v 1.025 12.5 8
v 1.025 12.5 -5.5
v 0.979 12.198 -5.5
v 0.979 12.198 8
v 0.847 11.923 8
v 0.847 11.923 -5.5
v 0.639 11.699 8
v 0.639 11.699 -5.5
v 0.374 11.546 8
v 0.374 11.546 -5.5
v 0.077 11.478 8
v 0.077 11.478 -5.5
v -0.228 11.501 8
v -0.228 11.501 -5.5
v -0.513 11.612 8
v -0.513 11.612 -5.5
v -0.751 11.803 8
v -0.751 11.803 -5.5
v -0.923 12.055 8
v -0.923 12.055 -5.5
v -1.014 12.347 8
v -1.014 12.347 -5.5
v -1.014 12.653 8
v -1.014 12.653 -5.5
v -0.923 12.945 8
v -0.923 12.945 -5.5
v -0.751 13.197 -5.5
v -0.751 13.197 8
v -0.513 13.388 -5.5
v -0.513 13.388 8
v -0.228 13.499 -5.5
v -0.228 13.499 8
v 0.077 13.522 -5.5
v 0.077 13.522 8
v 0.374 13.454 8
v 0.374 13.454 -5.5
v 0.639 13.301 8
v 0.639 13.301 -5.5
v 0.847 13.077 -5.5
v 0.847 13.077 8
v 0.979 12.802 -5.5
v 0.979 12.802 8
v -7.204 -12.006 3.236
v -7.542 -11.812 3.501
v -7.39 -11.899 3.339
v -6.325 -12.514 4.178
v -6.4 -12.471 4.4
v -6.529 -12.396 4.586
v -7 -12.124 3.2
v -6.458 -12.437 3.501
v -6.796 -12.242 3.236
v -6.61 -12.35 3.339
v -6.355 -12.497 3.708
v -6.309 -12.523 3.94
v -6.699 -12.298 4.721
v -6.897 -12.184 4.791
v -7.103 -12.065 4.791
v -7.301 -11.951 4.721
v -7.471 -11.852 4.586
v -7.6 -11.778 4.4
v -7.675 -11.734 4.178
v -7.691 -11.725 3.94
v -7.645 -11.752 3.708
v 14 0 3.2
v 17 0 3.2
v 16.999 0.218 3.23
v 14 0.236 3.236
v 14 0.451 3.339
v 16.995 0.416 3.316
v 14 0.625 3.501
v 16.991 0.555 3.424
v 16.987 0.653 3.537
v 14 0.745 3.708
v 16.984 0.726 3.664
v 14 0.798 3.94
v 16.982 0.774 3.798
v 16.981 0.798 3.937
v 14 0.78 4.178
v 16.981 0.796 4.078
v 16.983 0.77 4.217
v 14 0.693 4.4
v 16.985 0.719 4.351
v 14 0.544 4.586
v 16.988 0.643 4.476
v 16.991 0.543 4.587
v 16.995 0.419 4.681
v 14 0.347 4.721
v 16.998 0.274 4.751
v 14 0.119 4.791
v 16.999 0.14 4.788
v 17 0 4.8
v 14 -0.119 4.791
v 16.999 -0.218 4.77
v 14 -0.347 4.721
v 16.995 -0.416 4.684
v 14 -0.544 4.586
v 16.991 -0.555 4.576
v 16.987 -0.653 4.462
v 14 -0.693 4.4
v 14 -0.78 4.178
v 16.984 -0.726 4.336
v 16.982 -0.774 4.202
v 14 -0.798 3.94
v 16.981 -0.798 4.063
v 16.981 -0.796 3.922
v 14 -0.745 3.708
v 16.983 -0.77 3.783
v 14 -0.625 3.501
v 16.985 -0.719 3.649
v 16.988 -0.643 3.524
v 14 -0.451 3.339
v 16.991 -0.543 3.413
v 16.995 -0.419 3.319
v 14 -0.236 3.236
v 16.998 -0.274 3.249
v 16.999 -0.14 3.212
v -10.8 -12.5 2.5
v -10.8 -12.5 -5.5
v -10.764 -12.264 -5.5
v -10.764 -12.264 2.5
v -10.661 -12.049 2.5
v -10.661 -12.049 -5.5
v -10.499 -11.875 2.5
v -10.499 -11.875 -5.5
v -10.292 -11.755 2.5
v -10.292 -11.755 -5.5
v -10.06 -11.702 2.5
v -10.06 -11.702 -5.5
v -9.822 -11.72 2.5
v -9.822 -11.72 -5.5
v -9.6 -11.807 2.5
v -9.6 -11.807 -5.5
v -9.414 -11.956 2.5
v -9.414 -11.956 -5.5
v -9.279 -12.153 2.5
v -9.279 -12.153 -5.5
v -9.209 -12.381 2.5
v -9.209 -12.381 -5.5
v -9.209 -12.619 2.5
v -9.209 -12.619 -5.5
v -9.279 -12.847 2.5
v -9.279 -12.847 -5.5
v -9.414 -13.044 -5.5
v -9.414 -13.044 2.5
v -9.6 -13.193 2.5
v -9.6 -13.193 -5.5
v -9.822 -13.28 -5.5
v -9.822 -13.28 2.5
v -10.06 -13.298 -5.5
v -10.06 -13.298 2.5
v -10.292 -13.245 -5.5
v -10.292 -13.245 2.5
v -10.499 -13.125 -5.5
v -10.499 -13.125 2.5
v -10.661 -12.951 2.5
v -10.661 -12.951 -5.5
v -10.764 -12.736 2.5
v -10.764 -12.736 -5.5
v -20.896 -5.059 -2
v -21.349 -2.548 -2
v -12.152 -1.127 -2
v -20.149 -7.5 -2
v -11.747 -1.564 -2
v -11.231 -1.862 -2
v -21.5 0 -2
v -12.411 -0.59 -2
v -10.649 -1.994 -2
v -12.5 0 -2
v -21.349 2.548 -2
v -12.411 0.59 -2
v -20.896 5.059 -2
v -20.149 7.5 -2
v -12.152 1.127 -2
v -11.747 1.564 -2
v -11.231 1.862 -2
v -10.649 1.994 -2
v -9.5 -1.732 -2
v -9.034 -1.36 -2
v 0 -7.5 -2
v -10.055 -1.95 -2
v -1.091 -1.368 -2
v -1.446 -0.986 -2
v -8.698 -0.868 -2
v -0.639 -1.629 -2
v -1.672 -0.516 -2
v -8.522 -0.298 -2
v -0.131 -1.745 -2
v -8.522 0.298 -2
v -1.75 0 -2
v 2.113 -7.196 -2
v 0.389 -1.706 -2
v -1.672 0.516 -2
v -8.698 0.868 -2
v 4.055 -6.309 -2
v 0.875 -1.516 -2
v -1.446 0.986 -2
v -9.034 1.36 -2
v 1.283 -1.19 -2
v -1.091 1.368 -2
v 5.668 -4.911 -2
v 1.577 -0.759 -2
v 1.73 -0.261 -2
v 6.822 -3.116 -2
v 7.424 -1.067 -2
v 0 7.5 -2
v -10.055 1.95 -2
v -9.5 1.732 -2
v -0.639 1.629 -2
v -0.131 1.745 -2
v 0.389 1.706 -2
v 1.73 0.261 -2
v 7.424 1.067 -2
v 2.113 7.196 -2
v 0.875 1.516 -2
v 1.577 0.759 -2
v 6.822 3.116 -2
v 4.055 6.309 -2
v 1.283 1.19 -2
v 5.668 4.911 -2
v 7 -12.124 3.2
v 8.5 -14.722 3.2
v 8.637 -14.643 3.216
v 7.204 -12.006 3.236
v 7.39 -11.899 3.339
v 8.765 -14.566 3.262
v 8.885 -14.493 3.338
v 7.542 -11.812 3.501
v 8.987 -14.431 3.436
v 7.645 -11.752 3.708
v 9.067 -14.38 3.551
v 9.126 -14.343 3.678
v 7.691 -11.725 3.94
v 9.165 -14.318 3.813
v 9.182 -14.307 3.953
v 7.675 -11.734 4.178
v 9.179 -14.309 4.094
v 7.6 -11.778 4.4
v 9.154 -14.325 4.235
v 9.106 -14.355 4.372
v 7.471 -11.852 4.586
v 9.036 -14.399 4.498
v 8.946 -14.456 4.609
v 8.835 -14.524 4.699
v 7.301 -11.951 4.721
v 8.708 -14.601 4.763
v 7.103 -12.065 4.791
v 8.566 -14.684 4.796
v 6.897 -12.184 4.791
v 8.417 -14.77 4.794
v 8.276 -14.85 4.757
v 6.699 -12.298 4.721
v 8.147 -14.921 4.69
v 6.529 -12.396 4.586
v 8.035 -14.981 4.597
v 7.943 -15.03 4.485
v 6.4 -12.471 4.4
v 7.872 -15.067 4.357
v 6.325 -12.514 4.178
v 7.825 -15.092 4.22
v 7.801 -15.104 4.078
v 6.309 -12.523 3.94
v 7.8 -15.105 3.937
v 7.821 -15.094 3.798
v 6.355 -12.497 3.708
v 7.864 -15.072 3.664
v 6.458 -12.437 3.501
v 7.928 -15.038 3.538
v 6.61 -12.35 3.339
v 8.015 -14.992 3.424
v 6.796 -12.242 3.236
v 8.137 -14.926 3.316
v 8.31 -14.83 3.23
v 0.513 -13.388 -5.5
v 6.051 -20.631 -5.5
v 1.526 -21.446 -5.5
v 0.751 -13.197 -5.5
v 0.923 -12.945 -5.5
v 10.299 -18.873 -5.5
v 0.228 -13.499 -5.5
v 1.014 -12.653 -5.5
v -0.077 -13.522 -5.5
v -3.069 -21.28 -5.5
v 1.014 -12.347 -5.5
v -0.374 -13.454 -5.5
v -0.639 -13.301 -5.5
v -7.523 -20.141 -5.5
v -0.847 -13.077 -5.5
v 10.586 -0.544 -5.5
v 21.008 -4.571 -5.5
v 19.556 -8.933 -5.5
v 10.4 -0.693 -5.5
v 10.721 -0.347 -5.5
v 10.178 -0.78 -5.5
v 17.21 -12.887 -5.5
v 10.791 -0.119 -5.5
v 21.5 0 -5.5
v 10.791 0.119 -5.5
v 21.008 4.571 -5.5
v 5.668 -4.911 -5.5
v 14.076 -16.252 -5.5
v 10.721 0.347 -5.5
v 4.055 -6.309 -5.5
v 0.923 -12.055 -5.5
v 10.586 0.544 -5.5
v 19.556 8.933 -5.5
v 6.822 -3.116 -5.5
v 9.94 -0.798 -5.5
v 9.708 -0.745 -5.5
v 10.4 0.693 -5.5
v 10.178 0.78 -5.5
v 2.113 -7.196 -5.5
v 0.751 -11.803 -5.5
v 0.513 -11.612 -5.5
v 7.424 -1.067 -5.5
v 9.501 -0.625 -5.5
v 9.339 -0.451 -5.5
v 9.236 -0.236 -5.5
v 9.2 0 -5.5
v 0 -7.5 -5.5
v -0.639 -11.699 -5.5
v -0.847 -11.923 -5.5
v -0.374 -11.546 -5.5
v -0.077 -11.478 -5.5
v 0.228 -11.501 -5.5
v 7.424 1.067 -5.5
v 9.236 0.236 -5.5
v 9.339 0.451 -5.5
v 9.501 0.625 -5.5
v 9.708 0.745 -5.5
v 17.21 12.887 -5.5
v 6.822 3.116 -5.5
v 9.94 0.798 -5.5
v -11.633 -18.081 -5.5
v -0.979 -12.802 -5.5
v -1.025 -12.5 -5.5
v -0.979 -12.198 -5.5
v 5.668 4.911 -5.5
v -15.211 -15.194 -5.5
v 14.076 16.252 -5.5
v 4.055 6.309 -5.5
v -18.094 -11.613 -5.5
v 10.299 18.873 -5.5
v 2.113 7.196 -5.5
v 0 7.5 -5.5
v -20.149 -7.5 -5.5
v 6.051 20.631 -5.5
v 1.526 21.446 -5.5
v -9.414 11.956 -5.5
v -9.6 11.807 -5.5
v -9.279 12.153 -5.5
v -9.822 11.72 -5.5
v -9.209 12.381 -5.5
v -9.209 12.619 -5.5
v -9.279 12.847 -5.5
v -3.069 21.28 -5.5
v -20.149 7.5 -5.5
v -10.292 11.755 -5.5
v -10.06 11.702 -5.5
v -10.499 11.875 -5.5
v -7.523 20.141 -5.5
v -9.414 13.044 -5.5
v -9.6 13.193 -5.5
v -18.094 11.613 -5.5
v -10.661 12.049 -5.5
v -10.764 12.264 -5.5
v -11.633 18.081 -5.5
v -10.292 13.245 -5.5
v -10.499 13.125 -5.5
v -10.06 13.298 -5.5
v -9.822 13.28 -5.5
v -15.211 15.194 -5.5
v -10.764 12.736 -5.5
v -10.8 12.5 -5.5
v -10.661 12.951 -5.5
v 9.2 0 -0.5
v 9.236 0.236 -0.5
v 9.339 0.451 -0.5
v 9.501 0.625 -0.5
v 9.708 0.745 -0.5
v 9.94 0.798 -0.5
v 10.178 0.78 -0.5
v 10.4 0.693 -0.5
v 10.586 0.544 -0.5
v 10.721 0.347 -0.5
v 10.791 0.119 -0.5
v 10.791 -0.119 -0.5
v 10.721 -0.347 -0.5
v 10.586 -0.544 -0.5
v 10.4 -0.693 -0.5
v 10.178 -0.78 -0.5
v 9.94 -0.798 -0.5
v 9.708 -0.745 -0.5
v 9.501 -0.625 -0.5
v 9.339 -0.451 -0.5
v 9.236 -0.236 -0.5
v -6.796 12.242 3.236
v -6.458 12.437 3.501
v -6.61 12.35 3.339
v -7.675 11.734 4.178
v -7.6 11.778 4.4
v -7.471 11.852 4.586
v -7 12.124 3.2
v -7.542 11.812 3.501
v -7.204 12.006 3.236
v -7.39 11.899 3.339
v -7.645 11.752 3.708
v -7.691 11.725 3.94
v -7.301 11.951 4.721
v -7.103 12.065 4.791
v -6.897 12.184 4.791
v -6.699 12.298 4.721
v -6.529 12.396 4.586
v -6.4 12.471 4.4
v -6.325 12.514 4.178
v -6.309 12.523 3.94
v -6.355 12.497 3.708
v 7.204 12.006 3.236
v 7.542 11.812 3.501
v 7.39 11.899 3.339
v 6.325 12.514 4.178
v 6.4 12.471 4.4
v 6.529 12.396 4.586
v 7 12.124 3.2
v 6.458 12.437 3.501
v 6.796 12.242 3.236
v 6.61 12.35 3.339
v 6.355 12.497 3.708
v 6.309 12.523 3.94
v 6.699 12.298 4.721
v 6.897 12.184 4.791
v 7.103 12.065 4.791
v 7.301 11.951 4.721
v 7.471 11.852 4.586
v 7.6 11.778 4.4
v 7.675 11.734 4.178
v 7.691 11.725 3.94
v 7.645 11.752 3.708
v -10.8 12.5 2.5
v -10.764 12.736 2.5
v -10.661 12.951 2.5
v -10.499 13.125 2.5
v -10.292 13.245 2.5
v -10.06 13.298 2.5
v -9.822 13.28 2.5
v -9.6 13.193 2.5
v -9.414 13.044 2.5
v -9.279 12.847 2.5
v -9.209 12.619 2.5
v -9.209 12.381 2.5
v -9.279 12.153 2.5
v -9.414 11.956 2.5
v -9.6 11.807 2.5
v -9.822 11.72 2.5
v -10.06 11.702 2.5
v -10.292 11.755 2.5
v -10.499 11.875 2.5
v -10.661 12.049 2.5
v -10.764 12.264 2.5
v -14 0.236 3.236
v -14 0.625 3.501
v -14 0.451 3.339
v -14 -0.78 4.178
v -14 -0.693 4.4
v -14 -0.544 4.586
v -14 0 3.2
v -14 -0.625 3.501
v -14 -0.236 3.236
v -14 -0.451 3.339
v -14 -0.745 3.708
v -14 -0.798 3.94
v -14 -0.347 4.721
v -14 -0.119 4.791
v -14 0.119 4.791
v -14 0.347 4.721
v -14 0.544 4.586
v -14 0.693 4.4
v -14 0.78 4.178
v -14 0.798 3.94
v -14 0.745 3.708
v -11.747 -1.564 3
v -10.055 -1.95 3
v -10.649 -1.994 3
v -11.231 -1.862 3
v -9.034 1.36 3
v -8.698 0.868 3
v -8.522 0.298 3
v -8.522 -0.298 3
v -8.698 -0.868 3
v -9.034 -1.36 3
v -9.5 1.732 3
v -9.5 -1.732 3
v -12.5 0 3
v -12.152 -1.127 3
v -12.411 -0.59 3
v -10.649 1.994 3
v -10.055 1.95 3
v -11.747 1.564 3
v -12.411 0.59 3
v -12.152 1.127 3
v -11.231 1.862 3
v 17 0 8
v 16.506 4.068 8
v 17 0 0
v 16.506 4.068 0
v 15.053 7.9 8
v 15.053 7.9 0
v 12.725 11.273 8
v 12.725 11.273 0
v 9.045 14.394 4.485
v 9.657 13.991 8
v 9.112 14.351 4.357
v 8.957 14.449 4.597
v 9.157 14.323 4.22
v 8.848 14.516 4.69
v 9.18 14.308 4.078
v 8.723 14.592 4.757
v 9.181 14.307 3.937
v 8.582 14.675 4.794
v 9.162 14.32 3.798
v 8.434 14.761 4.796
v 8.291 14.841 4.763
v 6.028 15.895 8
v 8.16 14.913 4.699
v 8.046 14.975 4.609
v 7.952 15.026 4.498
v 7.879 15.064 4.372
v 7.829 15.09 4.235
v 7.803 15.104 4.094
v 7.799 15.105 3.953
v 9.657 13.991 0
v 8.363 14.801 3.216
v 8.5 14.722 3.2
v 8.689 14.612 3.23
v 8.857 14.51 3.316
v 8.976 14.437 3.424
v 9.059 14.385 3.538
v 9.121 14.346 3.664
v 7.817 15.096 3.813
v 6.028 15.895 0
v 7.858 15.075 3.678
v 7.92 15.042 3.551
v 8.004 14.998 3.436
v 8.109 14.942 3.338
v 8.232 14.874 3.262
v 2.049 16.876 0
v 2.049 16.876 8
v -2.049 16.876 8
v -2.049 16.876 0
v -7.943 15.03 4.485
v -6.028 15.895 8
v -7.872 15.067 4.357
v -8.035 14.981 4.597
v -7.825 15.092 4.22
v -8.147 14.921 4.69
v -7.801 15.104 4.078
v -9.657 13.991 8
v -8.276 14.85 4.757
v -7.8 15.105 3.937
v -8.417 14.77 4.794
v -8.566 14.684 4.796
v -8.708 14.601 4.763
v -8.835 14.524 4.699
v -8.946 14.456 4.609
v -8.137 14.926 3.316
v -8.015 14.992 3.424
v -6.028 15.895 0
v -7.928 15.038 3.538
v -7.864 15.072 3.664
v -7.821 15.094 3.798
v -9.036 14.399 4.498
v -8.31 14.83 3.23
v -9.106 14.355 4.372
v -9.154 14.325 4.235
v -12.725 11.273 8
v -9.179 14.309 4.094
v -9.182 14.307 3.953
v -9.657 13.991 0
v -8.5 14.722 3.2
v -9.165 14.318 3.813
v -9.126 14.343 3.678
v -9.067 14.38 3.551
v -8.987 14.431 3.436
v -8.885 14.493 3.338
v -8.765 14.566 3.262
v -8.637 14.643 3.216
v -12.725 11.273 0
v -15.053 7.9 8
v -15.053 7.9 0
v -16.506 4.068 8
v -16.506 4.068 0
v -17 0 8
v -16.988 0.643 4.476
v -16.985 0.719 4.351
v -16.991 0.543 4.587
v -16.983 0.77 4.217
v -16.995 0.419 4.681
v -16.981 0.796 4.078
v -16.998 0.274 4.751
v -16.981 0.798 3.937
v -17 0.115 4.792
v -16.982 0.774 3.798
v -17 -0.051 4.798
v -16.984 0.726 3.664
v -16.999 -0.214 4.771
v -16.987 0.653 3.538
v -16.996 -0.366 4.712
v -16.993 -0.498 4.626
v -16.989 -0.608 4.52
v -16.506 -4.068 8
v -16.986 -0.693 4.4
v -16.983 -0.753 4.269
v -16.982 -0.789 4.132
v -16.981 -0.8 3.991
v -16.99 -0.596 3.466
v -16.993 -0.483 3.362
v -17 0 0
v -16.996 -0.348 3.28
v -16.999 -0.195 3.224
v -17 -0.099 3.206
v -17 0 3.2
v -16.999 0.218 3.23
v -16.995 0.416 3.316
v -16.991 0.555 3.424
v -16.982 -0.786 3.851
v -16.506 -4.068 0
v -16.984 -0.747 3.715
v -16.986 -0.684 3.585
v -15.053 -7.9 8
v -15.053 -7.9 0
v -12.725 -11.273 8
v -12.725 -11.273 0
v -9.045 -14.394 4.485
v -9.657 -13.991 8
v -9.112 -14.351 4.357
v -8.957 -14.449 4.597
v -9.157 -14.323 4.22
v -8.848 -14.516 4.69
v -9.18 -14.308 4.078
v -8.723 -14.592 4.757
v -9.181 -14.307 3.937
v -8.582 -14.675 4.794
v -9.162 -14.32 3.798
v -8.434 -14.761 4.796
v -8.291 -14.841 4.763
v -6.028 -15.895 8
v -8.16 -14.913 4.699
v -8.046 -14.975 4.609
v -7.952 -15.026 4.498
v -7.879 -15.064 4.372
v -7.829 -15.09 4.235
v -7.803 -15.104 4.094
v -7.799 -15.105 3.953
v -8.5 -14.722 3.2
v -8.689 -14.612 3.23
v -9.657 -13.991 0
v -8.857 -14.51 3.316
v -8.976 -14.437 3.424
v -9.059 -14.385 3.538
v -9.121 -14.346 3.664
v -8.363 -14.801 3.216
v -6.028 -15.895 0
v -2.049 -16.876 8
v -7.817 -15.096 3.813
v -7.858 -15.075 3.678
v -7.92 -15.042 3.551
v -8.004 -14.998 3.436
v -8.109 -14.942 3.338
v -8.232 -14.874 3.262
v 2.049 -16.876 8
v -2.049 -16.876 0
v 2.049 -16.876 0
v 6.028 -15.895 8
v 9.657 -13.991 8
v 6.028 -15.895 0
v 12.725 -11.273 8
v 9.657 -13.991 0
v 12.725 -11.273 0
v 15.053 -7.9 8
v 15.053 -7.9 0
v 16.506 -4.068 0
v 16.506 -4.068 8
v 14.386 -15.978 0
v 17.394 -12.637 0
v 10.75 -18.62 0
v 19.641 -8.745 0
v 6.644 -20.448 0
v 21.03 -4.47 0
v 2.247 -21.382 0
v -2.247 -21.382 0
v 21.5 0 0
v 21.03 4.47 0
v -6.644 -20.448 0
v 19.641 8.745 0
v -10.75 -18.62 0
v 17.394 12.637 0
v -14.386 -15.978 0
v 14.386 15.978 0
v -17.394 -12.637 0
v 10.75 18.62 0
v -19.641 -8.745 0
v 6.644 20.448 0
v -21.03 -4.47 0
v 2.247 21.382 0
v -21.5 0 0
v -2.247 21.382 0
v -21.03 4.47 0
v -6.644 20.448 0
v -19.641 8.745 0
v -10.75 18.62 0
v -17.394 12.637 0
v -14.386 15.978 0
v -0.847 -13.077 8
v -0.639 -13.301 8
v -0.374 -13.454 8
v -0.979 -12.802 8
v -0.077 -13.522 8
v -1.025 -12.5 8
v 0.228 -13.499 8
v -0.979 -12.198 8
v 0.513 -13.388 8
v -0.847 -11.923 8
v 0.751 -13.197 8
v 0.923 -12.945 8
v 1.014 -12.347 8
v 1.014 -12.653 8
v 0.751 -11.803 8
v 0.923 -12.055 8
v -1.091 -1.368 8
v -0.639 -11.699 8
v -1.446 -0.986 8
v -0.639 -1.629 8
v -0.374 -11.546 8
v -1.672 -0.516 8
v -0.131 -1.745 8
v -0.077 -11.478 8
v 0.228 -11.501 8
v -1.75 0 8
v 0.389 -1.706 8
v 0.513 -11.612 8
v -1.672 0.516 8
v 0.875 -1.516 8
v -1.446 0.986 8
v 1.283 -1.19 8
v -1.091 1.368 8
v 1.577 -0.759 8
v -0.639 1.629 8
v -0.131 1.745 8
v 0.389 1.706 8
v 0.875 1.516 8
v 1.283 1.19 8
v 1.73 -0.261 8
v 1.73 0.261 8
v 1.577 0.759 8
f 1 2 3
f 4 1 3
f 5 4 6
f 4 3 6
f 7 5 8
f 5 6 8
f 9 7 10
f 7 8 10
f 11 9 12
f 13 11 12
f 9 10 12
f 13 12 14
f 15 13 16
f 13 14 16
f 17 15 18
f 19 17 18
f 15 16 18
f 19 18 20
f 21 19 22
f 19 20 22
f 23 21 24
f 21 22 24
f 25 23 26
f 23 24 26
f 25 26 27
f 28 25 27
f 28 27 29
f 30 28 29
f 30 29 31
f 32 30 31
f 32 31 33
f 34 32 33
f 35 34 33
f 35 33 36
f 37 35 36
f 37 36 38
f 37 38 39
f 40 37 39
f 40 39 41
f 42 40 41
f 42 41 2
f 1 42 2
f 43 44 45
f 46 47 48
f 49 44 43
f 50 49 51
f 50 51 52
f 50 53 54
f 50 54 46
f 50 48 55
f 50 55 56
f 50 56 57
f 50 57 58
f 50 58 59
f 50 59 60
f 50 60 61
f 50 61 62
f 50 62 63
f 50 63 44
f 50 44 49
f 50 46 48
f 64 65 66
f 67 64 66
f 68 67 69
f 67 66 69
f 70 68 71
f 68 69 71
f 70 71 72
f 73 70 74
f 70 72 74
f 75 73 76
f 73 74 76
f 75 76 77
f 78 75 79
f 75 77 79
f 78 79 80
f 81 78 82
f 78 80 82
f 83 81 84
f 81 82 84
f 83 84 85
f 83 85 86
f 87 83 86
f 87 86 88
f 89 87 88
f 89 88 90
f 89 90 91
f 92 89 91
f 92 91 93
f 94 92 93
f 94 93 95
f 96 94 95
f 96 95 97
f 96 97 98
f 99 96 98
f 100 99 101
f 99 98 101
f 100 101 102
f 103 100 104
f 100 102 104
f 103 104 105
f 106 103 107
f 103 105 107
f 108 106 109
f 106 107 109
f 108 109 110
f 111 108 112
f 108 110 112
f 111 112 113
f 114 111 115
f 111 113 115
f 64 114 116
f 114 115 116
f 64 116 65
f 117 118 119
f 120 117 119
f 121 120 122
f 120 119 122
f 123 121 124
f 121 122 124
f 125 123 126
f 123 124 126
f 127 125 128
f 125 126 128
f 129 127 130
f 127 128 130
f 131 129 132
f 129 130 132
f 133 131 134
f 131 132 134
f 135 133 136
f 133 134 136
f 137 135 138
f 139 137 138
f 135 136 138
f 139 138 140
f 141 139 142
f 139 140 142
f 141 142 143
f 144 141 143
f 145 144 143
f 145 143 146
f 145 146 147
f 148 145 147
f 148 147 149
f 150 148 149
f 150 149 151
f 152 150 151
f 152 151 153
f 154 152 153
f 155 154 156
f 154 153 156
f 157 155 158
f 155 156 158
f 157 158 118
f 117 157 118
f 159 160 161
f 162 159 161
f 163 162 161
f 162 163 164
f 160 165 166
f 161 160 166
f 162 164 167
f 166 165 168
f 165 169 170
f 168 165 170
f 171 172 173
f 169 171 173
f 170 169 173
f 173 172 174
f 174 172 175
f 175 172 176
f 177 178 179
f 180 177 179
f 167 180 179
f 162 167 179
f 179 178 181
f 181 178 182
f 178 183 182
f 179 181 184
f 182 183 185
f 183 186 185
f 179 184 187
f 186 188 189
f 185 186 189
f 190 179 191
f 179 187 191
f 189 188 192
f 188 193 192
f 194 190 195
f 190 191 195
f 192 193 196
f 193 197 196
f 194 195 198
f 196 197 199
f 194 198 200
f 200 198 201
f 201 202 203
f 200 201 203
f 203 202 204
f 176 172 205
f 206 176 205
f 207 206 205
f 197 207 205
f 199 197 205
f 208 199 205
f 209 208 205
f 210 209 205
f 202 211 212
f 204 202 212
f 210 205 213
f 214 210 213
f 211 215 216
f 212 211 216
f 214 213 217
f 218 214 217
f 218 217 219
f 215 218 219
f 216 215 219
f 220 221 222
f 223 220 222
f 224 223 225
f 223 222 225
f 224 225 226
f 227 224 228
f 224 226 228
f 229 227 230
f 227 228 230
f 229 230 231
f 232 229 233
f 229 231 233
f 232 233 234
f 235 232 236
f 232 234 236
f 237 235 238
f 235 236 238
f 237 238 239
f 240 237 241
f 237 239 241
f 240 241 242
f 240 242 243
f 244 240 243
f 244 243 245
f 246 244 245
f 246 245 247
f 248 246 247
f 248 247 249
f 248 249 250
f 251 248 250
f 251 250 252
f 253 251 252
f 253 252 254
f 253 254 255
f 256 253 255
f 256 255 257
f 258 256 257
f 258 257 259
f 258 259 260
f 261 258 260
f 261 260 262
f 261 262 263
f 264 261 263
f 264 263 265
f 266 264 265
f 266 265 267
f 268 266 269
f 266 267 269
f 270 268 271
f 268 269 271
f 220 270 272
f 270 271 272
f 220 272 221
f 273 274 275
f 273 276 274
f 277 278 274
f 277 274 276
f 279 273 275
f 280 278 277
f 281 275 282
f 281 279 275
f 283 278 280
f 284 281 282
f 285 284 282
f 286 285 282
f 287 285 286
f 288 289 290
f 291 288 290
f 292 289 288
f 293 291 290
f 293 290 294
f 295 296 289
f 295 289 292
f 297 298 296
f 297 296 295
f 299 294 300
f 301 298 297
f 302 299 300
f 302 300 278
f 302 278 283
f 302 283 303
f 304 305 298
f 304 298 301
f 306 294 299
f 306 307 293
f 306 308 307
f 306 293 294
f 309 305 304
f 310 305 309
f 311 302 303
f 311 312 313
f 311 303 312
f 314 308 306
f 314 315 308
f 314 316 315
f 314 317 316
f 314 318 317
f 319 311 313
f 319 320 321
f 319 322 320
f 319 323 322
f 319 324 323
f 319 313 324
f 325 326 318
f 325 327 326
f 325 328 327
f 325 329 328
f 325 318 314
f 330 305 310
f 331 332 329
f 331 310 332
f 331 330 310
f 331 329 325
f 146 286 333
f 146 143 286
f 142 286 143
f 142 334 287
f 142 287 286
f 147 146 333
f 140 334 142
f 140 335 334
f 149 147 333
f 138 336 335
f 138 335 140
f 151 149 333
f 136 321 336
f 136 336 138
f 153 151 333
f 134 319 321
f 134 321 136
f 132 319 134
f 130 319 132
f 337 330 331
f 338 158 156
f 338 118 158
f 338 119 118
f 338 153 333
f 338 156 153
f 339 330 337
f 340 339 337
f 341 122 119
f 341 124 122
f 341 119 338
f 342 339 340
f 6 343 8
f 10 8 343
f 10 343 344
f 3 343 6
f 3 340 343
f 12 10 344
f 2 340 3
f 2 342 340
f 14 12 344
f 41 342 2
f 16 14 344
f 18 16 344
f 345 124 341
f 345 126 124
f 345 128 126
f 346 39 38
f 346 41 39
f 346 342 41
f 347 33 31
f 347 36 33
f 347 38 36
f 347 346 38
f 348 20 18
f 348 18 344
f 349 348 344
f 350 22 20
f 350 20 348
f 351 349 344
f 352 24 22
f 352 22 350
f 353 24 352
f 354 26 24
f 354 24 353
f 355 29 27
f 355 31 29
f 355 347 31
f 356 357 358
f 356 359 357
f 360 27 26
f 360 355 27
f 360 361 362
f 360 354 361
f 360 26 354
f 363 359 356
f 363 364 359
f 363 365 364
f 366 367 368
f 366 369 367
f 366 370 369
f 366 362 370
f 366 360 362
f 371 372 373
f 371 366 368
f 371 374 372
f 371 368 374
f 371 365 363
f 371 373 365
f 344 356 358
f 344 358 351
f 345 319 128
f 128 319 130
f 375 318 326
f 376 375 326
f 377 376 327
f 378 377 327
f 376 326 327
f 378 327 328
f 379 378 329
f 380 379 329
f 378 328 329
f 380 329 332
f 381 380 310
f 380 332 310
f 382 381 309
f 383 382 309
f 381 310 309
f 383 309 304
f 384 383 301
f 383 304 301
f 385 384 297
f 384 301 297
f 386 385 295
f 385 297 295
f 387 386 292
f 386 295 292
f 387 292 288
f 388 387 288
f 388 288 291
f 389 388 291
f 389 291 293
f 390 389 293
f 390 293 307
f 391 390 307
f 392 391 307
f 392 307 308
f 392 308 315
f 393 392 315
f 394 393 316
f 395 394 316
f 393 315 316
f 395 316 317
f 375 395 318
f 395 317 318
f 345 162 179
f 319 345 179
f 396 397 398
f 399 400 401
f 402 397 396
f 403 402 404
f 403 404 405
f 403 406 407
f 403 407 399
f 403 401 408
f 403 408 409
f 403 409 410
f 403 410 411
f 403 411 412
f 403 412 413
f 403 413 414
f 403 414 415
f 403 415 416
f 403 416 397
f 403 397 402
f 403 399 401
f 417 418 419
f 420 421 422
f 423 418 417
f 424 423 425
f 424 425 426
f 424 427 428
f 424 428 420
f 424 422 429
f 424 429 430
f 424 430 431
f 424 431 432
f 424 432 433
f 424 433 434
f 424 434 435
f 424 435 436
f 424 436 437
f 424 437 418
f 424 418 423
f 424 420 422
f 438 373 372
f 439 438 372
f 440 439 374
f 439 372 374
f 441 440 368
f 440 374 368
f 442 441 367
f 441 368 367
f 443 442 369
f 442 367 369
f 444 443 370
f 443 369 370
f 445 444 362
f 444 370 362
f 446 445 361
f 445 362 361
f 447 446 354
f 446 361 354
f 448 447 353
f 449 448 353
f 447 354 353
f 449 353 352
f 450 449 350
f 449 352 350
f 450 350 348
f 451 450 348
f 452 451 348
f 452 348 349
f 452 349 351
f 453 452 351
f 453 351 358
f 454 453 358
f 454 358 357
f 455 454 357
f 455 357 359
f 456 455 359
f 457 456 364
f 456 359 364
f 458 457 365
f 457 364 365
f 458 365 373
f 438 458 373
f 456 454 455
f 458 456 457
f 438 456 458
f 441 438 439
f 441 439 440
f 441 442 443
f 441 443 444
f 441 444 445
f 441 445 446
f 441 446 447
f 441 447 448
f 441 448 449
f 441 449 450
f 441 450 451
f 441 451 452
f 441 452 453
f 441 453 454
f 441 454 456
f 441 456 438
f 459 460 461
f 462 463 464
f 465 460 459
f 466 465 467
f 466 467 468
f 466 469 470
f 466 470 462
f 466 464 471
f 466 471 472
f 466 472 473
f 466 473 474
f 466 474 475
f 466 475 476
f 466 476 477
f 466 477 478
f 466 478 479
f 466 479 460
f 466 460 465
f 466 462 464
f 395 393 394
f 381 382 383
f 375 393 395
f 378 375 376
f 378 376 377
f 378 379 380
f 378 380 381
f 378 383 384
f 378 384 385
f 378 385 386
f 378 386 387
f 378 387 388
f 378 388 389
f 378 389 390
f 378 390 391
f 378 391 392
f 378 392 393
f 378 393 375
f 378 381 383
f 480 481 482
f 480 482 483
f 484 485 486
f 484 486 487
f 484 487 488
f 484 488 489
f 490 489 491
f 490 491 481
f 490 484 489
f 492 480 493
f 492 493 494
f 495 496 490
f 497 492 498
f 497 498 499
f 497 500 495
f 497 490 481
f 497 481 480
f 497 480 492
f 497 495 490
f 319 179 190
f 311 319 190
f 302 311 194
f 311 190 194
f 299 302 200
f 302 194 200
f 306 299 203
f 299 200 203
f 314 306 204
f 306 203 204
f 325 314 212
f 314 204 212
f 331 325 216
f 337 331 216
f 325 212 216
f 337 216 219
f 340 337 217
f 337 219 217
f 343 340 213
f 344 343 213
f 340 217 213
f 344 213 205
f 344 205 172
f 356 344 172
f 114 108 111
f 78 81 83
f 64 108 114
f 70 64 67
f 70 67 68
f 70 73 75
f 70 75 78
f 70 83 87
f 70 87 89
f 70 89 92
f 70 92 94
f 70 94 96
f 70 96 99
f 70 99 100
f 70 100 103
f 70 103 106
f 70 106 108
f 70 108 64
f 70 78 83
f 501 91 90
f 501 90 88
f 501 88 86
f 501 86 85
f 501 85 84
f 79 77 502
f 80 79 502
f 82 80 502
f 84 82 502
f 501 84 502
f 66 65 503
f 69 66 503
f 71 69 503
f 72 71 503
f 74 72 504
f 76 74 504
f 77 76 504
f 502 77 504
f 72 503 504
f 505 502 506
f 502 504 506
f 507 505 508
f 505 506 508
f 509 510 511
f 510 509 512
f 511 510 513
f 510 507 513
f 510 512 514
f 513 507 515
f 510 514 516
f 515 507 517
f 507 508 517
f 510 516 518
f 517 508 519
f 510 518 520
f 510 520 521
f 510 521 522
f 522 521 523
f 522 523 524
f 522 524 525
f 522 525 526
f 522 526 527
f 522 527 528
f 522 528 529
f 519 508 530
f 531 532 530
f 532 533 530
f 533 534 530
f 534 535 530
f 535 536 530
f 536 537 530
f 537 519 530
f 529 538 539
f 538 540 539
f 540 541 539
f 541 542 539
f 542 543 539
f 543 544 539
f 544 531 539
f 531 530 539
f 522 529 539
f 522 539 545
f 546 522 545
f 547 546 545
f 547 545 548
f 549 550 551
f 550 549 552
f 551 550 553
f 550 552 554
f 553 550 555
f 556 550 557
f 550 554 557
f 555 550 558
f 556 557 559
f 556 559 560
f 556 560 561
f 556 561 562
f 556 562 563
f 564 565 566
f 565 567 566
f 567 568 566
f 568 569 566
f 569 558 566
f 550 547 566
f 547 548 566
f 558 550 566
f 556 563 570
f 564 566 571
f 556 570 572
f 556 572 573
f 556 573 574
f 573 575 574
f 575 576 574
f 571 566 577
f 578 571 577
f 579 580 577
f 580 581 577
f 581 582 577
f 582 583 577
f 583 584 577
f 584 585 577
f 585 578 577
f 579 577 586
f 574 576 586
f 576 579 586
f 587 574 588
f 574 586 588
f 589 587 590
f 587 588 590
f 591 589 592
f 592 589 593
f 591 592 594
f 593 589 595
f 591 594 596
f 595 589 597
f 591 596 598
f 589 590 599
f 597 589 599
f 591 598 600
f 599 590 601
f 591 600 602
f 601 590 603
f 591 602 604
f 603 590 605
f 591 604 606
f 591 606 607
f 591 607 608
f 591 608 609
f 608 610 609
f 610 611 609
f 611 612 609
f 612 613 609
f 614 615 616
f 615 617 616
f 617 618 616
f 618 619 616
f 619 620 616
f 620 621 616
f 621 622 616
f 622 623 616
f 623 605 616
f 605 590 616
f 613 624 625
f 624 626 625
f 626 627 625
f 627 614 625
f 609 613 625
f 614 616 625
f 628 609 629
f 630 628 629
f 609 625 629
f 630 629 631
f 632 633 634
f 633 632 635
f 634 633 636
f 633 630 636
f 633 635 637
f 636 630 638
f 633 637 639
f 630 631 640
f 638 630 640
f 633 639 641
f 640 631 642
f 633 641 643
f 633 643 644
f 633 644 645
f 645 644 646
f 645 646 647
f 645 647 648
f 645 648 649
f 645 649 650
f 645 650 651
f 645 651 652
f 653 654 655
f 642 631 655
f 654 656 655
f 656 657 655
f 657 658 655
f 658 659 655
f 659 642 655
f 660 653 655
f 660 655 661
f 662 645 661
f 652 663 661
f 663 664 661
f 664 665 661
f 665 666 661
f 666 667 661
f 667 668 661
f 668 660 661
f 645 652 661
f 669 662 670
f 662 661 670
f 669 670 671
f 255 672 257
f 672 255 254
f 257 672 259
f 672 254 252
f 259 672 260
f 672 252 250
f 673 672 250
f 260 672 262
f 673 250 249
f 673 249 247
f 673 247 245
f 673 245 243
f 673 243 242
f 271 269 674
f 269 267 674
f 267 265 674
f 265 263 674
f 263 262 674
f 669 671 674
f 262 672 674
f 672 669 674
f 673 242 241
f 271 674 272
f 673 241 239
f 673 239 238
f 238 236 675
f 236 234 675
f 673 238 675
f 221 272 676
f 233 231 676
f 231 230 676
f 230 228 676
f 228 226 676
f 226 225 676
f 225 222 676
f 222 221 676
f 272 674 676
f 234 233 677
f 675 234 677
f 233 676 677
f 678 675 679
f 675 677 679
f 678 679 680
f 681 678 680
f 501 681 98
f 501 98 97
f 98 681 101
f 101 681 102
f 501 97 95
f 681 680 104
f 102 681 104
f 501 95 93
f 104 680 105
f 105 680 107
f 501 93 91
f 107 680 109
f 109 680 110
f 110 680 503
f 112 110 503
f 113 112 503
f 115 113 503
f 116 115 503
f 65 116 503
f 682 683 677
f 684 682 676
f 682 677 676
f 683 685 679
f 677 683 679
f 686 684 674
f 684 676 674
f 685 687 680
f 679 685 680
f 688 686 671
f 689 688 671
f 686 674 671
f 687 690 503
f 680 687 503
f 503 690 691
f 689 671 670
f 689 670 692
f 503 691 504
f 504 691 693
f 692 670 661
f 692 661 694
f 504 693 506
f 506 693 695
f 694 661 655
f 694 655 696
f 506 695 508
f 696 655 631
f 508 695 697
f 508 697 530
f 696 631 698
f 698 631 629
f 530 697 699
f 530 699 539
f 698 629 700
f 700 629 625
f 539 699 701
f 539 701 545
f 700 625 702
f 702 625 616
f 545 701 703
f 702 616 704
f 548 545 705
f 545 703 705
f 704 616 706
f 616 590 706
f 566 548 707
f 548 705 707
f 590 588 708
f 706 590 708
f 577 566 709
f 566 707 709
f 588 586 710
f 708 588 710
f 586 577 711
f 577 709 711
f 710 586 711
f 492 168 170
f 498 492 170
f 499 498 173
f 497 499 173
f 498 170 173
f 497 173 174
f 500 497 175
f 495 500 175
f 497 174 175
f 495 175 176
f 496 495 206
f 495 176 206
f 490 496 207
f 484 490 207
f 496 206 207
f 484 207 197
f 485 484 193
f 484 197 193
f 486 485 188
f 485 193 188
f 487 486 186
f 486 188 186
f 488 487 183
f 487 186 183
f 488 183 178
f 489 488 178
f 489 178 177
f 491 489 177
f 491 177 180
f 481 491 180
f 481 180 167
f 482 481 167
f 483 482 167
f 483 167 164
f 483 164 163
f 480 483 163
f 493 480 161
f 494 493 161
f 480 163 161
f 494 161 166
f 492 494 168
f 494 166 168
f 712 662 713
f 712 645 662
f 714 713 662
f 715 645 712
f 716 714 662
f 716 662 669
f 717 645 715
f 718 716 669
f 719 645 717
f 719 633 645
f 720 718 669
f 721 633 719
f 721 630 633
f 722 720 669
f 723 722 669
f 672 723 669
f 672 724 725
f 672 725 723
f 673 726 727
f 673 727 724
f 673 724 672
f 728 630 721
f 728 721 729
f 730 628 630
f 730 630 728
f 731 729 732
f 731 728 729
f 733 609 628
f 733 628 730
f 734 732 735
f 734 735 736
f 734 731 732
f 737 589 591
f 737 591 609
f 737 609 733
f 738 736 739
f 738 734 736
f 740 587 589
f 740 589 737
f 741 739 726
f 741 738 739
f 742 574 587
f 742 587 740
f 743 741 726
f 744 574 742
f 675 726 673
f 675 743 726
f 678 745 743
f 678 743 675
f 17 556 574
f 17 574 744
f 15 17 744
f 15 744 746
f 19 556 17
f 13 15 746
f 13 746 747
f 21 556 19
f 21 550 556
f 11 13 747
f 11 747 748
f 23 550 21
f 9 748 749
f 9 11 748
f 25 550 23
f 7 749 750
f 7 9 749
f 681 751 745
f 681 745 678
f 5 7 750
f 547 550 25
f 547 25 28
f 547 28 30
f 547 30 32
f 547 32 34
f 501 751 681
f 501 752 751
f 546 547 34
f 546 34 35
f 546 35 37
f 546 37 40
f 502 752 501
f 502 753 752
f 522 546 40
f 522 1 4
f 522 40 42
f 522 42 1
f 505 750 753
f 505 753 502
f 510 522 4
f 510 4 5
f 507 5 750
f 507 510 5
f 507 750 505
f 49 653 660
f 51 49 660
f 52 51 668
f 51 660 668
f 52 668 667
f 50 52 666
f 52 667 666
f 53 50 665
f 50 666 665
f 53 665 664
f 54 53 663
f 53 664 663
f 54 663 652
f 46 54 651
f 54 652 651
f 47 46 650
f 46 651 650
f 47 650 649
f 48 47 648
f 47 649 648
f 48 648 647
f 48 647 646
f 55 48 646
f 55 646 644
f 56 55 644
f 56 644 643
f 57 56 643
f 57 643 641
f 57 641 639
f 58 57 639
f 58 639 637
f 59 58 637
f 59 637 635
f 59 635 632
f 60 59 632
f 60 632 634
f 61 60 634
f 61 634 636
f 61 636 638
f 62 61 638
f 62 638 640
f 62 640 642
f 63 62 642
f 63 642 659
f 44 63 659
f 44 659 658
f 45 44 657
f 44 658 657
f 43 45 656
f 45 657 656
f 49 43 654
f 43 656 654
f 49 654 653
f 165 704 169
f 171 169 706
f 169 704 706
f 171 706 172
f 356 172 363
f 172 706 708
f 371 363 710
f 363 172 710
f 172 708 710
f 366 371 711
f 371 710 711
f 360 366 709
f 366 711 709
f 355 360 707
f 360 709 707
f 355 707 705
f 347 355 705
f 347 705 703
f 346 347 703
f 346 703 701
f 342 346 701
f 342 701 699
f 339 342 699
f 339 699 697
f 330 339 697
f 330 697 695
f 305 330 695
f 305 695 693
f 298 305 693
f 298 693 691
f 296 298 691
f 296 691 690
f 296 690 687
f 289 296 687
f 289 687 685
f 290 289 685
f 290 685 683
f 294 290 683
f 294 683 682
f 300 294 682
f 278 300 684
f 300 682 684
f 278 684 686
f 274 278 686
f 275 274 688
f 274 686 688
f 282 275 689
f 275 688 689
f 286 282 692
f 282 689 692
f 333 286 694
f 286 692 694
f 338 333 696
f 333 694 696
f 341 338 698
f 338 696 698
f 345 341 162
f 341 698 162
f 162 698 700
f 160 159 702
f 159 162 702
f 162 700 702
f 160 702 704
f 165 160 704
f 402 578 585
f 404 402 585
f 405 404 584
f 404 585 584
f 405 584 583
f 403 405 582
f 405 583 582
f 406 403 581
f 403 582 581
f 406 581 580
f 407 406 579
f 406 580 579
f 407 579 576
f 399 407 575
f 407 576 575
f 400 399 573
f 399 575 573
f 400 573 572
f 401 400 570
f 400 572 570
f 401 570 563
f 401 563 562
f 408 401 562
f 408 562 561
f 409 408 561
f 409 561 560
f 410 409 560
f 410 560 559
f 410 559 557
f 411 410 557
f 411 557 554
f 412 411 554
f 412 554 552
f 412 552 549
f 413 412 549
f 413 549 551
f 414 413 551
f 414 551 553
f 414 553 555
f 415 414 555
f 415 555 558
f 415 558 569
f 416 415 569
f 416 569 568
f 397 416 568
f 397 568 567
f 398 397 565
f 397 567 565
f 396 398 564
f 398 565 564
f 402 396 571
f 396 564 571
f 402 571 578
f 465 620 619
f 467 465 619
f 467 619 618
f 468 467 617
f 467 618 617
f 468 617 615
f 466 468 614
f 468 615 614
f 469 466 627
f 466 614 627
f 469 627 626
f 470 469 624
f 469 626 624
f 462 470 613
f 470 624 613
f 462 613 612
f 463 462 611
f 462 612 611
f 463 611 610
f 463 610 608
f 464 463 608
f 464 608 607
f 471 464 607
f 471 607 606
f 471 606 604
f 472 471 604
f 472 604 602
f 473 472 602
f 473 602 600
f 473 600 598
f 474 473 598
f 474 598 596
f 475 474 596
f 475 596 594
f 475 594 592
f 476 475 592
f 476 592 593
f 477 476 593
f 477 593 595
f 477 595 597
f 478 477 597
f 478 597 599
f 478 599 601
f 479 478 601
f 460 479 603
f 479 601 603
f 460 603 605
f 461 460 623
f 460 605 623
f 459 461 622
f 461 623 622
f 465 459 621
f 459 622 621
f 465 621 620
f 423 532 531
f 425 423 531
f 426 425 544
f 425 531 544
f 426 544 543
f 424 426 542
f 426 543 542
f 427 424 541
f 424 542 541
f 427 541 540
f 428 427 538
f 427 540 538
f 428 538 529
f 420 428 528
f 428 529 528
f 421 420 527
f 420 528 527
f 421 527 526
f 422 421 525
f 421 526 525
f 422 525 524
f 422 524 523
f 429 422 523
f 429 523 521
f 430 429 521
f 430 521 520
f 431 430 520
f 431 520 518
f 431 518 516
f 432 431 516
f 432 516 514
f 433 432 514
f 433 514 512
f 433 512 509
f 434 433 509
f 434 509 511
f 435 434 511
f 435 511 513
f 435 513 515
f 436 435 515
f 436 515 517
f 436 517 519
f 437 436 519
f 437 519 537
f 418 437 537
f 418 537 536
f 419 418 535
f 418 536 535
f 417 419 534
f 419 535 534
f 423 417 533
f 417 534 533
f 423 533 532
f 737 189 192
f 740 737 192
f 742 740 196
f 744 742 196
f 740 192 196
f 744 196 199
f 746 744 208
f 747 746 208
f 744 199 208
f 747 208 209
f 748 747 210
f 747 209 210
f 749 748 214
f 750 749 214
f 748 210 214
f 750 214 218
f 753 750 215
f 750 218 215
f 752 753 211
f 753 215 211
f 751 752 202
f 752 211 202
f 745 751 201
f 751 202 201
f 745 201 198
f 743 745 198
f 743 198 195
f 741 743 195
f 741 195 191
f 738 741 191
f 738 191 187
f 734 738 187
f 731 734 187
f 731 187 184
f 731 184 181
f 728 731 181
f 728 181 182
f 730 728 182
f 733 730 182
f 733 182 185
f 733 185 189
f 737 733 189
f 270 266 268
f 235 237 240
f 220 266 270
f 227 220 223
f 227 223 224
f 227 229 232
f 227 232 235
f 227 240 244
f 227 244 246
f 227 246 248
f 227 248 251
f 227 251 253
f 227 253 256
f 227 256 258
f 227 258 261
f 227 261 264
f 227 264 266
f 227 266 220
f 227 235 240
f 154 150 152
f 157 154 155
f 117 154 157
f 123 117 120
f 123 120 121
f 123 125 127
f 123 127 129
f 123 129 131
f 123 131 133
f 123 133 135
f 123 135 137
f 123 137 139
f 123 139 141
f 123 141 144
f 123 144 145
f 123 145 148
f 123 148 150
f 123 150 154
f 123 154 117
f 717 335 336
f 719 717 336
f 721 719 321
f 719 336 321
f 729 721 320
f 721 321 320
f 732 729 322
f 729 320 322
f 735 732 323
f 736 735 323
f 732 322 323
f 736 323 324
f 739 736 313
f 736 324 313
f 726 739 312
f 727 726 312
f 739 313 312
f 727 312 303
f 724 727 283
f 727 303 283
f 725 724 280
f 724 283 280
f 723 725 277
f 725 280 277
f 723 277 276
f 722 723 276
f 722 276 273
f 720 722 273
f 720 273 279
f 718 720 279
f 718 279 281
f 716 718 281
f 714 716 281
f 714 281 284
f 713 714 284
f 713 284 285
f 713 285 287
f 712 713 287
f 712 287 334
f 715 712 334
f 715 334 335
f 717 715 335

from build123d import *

# Parameters (mm, degrees)
SKETCH_1_R               = 17
EXTRUDE_1_DEPTH          = 8
SKETCH_2_R               = 21.5
EXTRUDE_2_DEPTH          = 5.5
SKETCH_3_R               = 1.75
CUT_EXTRUDE_1_DEPTH      = 34.26785235
CUT_EXTRUDE_START        = -3.5
CUT_EXTRUDE_2_DEPTH      = 3.5
SKETCH_5_R               = 1.025
CUT_EXTRUDE_3_DEPTH      = 34.26785235
SKETCH_5_3_R             = 0.8
CUT_EXTRUDE_4_DEPTH      = 8
SKETCH_6_R               = 0.8
CUT_EXTRUDE_5_DEPTH      = 3
PATTERN_CIRCULAR_1_COUNT = 6
SKETCH_7_R               = 2
CUT_EXTRUDE_6_DEPTH      = 5
SKETCH_8_R               = 0.8
CUT_EXTRUDE_7_DEPTH      = 5


with BuildPart() as part:
    # 草图1 → 凸台-拉伸1 (new body)
    with BuildSketch(Plane.XY):
        Circle(SKETCH_1_R)
    extrude(amount=EXTRUDE_1_DEPTH)

    # 草图2 → 凸台-拉伸2 (add)
    with BuildSketch(Plane(origin=(0, 0, 0), x_dir=(-1, 0, 0), z_dir=(0, 0, -1))):
        Circle(SKETCH_2_R)
    extrude(amount=EXTRUDE_2_DEPTH)

    # 草图3 → 切除-拉伸1 (cut, through all)
    with BuildSketch(Plane(origin=(0, 0, -5.5), x_dir=(-1, 0, 0), z_dir=(0, 0, -1))):
        Circle(SKETCH_3_R)
    extrude(amount=-CUT_EXTRUDE_1_DEPTH, mode=Mode.SUBTRACT)

    # 草图4 → 切除-拉伸2 (cut)
    with BuildSketch(Plane(origin=(0, 0, -5.5), x_dir=(-1, 0, 0), z_dir=(0, 0, -1)).offset(CUT_EXTRUDE_START)):
        with BuildLine():
            Line((0, 7.5), (20.14944168, 7.5))
            ThreePointArc((20.14944168, 7.5), (21.5, 0), (20.14944168, -7.5))
            Line((20.14944168, -7.5), (0, -7.5))
            ThreePointArc((0, -7.5), (-7.5, 0), (0, 7.5))
        make_face()
    extrude(amount=CUT_EXTRUDE_2_DEPTH, mode=Mode.SUBTRACT)

    # 草图5 → 切除-拉伸3 (cut, through all)
    with BuildSketch(Plane(origin=(0, 0, -5.5), x_dir=(-1, 0, 0), z_dir=(0, 0, -1))):
        with Locations((0, -12.5)):
            Circle(SKETCH_5_R)
        with Locations((0, 12.5)):
            Circle(SKETCH_5_R)
    extrude(amount=-CUT_EXTRUDE_3_DEPTH, mode=Mode.SUBTRACT)

    # 草图5<3> → 切除-拉伸4 (cut)
    with BuildSketch(Plane(origin=(0, 0, -5.5), x_dir=(-1, 0, 0), z_dir=(0, 0, -1))):
        with Locations((10, -12.5)):
            Circle(SKETCH_5_3_R)
        with Locations((10, 12.5)):
            Circle(SKETCH_5_3_R)
    extrude(amount=-CUT_EXTRUDE_4_DEPTH, mode=Mode.SUBTRACT)

    # 草图6 → 切除-拉伸5 (cut)
    with BuildSketch(Plane(origin=(17, 0, 0), x_dir=(0, 0, -1), z_dir=(1, 0, 0))):
        with Locations((-4, 0)):
            Circle(SKETCH_6_R)
    cut_extrude_5 = extrude(amount=-CUT_EXTRUDE_5_DEPTH, mode=Mode.SUBTRACT)

    # 阵列(圆周)1: 切除-拉伸5 ×6 about axis
    pattern_circular_1_axis = Axis((0, 0, 8), (0, 0, -1))
    for i in range(1, PATTERN_CIRCULAR_1_COUNT):
        add(cut_extrude_5.rotate(pattern_circular_1_axis, i * 360 / PATTERN_CIRCULAR_1_COUNT), mode=Mode.SUBTRACT)

    # 草图7 → 切除-拉伸6 (cut)
    with BuildSketch(Plane(origin=(0, 0, -2), x_dir=(-1, 0, 0), z_dir=(0, 0, -1))):
        with Locations((10.5, 0)):
            Circle(SKETCH_7_R)
    extrude(amount=-CUT_EXTRUDE_6_DEPTH, mode=Mode.SUBTRACT)

    # 草图8 → 切除-拉伸7 (cut)
    with BuildSketch(Plane(origin=(0, 0, -5.5), x_dir=(-1, 0, 0), z_dir=(0, 0, -1))):
        with Locations((-10, 0)):
            Circle(SKETCH_8_R)
    extrude(amount=-CUT_EXTRUDE_7_DEPTH, mode=Mode.SUBTRACT)


solid = part.part
